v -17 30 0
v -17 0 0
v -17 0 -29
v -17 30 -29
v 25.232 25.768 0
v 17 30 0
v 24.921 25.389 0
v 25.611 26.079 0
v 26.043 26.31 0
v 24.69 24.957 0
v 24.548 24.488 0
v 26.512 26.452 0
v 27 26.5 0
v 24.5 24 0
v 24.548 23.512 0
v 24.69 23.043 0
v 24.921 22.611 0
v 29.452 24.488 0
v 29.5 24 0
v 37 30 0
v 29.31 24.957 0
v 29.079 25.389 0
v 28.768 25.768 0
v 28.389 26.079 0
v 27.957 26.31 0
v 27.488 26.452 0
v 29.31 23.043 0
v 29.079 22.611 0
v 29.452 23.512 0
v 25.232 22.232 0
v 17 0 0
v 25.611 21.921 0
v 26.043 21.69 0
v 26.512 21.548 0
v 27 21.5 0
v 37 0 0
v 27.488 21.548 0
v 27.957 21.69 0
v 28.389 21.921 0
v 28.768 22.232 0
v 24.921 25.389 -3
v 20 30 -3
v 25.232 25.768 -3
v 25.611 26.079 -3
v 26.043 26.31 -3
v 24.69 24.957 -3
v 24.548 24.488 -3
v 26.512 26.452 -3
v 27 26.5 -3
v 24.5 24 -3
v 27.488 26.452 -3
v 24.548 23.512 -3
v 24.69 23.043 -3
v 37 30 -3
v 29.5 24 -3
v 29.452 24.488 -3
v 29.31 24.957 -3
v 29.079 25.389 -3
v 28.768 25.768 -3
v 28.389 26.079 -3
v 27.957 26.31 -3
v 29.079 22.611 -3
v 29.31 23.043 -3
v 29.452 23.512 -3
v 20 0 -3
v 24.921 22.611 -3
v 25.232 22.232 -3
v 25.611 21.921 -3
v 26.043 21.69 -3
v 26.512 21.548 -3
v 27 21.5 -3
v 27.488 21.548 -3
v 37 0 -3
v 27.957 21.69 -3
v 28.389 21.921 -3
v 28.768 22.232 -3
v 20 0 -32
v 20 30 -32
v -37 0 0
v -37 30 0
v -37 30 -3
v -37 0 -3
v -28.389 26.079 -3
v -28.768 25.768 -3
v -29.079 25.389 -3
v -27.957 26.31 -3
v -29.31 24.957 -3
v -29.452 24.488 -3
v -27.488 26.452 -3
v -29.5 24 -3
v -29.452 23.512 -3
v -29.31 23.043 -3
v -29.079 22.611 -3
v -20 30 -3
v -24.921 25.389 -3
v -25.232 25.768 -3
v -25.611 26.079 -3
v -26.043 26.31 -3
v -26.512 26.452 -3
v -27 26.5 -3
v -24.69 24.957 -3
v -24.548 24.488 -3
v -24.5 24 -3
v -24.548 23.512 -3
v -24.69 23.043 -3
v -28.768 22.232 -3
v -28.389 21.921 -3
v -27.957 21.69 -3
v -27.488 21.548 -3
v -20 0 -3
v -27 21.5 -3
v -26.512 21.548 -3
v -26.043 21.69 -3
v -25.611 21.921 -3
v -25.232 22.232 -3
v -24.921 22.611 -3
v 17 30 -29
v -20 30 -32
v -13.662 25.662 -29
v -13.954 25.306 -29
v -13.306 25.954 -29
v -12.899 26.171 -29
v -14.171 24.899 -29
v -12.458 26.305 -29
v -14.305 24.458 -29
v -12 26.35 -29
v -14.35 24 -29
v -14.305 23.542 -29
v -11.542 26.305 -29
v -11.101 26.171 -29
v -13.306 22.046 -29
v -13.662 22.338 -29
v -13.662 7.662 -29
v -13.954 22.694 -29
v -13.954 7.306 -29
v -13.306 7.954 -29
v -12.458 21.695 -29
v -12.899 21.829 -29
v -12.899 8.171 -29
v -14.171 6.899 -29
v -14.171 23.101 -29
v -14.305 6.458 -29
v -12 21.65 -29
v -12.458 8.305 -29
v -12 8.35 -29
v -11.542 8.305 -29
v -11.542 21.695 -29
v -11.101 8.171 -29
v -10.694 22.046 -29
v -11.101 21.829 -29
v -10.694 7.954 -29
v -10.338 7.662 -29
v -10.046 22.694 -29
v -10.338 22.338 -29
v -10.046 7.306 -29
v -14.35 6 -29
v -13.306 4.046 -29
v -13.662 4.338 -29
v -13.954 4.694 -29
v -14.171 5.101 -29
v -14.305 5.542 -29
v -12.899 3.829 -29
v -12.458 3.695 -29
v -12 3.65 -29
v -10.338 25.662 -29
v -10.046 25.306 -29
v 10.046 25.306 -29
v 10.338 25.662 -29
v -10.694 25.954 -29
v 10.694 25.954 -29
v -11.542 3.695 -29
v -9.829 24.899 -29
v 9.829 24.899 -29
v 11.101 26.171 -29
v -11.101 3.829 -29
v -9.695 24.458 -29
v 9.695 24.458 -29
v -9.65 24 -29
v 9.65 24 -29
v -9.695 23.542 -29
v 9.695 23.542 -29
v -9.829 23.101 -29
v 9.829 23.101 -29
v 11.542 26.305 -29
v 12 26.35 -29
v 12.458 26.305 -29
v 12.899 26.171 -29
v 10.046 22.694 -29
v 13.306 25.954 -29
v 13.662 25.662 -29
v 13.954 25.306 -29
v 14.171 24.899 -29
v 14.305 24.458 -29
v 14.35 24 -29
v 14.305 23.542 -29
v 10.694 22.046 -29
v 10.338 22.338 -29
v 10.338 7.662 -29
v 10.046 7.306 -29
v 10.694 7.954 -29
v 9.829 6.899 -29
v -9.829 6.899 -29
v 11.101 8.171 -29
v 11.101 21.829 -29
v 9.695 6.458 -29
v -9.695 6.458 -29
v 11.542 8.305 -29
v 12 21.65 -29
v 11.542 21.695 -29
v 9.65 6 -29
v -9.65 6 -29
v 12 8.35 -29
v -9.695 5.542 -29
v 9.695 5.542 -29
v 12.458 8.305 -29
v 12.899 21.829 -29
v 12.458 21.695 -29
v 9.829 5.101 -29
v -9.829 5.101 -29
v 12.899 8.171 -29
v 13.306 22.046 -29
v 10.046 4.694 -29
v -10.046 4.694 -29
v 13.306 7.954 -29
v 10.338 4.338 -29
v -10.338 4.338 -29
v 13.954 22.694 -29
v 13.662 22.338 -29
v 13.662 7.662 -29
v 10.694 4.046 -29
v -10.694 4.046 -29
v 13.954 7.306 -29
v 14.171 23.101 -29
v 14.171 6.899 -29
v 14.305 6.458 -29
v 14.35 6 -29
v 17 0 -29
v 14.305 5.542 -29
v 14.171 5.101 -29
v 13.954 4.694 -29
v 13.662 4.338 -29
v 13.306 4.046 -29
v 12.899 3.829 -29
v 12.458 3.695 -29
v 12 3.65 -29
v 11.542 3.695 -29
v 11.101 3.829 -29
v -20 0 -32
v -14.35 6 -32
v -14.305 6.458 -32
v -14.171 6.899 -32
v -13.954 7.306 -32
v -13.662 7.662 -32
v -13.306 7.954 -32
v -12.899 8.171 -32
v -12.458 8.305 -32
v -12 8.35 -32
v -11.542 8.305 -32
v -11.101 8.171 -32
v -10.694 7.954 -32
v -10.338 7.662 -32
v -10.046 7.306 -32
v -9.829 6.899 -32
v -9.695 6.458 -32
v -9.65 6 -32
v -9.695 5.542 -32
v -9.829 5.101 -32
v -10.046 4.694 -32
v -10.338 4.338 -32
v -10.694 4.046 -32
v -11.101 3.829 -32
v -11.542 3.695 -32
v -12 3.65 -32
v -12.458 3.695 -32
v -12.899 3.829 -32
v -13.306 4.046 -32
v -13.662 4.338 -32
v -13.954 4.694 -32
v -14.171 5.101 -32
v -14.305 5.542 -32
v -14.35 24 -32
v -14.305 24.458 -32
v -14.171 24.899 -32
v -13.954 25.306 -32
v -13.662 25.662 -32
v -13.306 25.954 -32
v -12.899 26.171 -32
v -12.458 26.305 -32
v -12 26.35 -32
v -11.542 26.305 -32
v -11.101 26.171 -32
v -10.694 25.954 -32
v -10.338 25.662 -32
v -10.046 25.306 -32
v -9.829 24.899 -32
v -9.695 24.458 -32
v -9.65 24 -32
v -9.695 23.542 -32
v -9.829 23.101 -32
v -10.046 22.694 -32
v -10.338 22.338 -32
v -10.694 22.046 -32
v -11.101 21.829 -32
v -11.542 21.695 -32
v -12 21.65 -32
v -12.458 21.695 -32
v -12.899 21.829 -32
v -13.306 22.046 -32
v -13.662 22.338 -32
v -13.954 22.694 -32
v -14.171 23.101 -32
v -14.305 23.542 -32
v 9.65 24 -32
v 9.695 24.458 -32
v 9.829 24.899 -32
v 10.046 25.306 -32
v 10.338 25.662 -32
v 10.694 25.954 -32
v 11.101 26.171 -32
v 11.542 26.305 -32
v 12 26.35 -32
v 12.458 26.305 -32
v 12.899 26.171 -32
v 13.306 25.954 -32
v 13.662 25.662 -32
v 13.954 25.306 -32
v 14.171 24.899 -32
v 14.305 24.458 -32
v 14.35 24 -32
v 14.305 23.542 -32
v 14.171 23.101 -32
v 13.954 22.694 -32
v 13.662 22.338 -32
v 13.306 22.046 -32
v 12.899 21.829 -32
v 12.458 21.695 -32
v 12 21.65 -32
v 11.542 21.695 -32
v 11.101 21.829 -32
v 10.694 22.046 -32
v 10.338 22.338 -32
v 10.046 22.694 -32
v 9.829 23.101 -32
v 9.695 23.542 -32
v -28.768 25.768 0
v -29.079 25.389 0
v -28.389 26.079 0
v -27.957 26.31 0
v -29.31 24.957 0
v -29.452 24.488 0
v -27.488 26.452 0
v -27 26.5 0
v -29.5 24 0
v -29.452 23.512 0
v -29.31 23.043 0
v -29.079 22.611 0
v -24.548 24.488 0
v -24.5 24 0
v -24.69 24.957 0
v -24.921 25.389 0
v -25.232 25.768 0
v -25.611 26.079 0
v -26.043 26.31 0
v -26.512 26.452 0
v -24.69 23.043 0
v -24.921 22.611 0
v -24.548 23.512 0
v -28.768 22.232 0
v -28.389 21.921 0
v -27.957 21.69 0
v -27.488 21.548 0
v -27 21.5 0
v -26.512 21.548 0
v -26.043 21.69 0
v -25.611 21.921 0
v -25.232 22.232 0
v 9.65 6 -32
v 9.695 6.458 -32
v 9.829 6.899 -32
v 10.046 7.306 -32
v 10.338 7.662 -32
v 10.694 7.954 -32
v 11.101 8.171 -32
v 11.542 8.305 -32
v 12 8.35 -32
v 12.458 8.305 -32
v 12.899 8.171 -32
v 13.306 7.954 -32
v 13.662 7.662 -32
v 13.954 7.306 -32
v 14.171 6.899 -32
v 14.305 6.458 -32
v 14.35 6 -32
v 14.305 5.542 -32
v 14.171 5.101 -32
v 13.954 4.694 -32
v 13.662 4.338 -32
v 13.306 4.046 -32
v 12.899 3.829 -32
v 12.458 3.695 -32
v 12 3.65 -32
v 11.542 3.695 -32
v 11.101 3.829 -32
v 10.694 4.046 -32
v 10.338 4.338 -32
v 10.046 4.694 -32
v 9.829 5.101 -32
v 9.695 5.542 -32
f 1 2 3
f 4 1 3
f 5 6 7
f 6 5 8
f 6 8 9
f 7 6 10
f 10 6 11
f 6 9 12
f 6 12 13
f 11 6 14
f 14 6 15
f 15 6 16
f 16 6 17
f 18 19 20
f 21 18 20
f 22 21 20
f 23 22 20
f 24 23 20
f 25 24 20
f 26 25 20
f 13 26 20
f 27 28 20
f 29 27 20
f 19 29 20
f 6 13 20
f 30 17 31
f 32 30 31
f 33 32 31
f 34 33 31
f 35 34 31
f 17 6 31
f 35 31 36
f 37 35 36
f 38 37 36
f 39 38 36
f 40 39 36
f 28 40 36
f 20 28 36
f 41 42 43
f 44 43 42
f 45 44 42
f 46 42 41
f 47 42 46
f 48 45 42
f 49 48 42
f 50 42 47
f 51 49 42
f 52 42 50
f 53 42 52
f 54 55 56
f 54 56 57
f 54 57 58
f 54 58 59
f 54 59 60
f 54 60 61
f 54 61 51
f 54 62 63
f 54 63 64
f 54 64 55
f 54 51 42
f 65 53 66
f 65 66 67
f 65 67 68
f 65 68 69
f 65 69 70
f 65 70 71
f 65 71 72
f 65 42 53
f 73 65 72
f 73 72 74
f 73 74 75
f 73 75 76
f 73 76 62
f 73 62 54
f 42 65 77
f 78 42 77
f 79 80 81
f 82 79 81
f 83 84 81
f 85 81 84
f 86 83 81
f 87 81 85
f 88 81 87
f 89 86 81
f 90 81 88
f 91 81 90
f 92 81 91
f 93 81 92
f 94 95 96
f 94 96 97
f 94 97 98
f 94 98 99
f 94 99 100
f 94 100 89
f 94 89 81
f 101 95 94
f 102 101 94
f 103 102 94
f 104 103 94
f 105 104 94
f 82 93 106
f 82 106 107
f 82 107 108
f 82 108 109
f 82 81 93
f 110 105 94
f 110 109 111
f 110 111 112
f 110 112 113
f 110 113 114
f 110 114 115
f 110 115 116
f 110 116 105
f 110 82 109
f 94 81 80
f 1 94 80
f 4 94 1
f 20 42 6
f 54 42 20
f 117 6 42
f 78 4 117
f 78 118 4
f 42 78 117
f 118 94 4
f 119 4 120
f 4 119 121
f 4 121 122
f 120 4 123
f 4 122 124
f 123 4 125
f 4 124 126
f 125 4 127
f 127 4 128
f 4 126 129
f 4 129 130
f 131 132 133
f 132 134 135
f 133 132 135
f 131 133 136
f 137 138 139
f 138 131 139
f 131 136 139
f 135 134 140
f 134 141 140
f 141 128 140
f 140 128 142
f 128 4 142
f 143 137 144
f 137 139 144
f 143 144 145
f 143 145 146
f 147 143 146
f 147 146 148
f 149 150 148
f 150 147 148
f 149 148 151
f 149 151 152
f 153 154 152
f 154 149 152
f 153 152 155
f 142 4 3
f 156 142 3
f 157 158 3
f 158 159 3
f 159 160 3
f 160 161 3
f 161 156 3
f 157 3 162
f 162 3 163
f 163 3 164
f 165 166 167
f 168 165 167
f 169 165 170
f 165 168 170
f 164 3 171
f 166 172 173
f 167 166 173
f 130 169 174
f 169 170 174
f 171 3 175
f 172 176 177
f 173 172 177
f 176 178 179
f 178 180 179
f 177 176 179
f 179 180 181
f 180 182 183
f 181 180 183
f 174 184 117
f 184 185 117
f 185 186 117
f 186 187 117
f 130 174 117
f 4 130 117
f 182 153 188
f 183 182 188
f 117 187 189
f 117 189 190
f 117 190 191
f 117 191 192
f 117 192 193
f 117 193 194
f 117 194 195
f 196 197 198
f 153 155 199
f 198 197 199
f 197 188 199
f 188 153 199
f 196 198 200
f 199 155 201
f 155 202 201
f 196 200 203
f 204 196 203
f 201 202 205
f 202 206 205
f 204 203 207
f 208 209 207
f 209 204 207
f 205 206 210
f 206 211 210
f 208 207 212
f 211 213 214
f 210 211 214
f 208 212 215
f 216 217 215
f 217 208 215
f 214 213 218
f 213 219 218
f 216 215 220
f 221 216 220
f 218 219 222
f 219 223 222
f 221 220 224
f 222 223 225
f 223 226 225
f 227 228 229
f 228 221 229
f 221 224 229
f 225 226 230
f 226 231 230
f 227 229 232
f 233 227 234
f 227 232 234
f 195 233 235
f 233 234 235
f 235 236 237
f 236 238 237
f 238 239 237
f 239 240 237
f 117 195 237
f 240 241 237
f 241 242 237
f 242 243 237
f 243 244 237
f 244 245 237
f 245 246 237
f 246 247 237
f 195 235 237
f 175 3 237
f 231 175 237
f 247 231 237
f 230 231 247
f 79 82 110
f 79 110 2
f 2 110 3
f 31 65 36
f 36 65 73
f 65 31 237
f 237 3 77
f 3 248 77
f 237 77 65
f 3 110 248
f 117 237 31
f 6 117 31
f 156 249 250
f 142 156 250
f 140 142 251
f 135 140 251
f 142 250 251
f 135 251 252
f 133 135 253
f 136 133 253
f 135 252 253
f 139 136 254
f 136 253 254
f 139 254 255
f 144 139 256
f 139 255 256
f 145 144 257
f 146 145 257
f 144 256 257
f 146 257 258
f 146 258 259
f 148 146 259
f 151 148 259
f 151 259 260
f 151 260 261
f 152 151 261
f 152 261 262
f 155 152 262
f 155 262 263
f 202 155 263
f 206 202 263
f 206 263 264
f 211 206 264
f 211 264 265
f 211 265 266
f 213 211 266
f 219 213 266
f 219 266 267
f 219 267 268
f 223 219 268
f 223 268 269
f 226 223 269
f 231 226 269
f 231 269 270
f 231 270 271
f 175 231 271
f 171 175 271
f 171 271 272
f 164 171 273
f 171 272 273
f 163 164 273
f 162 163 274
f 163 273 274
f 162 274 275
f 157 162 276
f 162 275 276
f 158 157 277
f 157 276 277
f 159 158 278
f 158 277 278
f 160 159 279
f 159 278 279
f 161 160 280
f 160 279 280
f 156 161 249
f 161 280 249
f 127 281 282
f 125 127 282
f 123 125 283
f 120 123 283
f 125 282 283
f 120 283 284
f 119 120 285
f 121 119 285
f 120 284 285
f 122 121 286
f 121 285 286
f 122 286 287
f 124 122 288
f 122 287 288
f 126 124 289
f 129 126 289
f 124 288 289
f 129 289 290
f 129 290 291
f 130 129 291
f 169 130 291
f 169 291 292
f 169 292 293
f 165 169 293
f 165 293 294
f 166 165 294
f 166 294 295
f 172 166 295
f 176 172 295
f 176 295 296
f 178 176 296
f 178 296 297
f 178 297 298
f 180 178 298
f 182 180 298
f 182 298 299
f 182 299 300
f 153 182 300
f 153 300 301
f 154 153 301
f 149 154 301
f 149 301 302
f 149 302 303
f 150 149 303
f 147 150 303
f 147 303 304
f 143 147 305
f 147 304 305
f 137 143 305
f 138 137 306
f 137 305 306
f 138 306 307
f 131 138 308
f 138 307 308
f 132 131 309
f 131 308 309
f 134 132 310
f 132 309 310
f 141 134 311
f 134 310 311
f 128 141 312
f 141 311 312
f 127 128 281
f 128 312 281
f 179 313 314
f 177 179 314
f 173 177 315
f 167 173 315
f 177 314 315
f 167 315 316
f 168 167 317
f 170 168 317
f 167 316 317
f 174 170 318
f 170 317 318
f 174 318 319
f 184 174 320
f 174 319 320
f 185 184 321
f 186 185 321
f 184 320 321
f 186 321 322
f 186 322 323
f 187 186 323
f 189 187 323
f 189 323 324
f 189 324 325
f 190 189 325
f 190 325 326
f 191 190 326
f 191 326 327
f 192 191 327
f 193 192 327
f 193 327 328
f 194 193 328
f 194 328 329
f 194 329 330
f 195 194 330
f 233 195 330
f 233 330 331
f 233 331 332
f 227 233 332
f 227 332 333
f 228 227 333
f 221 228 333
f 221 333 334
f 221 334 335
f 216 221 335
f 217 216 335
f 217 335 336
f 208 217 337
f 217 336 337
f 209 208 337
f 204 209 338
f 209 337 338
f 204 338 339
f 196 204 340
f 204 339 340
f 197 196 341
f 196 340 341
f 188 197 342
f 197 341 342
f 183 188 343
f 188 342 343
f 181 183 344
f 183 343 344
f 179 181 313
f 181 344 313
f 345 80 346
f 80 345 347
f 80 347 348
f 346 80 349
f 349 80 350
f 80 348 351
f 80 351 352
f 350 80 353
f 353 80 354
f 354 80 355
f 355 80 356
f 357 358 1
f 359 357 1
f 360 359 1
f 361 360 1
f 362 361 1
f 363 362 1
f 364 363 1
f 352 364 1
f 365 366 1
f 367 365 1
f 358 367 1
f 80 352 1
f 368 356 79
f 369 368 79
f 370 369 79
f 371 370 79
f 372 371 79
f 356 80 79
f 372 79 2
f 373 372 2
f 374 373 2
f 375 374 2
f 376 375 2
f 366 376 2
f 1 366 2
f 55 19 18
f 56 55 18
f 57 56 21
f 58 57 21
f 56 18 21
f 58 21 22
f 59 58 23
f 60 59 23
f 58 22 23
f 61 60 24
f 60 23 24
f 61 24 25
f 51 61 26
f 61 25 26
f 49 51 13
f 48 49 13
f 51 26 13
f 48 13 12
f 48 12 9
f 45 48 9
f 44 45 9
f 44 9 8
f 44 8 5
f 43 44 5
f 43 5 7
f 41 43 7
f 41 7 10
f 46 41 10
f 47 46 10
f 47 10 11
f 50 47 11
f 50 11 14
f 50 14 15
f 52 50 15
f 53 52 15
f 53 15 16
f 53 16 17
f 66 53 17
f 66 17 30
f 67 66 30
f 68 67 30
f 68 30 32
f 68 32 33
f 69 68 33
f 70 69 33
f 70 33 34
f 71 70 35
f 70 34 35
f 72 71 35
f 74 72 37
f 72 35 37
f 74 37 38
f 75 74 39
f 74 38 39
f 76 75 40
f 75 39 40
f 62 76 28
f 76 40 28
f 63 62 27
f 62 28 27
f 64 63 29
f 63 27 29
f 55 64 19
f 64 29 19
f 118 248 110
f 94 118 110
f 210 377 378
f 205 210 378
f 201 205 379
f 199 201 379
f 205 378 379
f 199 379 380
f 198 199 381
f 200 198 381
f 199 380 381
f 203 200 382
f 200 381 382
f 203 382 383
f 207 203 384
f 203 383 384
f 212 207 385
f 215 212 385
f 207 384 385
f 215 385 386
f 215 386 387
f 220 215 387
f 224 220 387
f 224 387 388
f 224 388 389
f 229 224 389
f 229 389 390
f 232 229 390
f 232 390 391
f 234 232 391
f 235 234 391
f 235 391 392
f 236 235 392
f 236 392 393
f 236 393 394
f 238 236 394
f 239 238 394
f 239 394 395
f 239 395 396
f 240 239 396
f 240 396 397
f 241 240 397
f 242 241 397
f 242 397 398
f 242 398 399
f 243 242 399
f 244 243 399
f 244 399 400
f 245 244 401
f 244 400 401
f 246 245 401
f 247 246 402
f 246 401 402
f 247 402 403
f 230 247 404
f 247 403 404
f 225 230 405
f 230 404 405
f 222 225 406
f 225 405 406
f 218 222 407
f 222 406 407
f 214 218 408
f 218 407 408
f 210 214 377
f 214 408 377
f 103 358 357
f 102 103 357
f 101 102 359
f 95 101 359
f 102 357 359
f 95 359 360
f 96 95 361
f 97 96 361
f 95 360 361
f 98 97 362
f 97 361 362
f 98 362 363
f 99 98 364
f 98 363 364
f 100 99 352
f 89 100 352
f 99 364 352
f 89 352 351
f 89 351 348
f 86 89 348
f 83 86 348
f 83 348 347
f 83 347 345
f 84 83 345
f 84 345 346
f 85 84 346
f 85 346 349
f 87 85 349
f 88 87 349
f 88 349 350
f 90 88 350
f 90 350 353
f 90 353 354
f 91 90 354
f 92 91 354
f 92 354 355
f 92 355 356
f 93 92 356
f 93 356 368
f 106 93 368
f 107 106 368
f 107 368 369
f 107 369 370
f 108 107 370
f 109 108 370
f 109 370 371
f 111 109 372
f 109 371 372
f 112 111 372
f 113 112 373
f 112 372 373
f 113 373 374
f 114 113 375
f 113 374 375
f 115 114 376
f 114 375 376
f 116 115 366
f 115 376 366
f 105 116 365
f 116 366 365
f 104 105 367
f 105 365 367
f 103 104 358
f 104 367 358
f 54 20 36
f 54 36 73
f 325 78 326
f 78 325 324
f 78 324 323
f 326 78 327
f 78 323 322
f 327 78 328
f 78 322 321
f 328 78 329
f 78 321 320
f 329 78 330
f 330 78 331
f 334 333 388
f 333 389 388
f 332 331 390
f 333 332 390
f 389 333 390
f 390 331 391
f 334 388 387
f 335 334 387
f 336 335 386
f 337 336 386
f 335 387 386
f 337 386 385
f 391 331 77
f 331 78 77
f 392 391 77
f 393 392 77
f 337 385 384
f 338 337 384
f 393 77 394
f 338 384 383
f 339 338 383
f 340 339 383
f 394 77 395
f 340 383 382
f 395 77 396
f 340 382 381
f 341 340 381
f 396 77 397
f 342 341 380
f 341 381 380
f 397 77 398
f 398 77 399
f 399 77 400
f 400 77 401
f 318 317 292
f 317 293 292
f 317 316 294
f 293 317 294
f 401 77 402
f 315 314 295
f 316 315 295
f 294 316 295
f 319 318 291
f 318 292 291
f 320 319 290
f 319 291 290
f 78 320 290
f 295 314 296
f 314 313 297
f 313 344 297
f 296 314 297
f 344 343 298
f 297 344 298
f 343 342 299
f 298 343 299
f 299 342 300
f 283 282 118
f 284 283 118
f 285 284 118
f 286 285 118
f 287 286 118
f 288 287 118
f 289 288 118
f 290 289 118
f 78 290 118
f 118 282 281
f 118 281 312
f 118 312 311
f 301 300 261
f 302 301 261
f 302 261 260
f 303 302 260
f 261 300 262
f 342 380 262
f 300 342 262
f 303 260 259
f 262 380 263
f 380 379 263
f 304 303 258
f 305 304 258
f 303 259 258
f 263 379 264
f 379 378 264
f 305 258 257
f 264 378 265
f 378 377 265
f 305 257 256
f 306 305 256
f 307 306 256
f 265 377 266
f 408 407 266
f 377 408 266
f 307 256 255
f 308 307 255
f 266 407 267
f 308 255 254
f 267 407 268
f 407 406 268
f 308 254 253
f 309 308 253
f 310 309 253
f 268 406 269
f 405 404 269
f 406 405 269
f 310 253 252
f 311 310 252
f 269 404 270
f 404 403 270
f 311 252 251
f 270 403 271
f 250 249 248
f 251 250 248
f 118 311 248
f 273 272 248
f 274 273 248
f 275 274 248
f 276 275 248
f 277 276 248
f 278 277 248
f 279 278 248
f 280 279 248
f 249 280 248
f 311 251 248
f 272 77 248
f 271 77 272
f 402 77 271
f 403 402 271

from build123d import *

# Parameters (mm, degrees)
SKETCH1_W           = 3
SKETCH1_H           = 3
SKETCH1_W_2         = 17
BOSS_EXTRUDE1_DEPTH = 30
SKETCH2_R           = 2.5
CUT_EXTRUDE1_DEPTH  = 30
SKETCH3_R           = 2.35
CUT_EXTRUDE2_DEPTH  = 30


with BuildPart() as part:
    # Sketch1 → Boss-Extrude1 (new body)
    with BuildSketch(Plane(origin=(0, 0, 0), x_dir=(1, 0, 0), z_dir=(0, 1, 0))):
        Polygon((-17, 29), (0, 29), (17, 29), (17, 3), (20, 3), (20, 32), (-20, 32), (-20, 3), (-17, 3), align=None)
        with Locations((-18.5, 1.5)):
            Rectangle(SKETCH1_W, SKETCH1_H)
        with Locations((-28.5, 1.5)):
            Rectangle(SKETCH1_W_2, SKETCH1_H)
        with Locations((18.5, 1.5)):
            Rectangle(SKETCH1_W, SKETCH1_H)
        with Locations((28.5, 1.5)):
            Rectangle(SKETCH1_W_2, SKETCH1_H)
    extrude(amount=BOSS_EXTRUDE1_DEPTH)

    # Sketch2 → Cut-Extrude1 (cut)
    with BuildSketch(Plane.XY):
        with Locations((-27, 24)):
            Circle(SKETCH2_R)
        with Locations((27, 24)):
            Circle(SKETCH2_R)
    extrude(amount=-CUT_EXTRUDE1_DEPTH, mode=Mode.SUBTRACT)

    # Sketch3 → Cut-Extrude2 (cut)
    with BuildSketch(Plane(origin=(0, 0, -32), x_dir=(-1, 0, 0), z_dir=(0, 0, -1))):
        with Locations((-12, 6)):
            Circle(SKETCH3_R)
        with Locations((12, 6)):
            Circle(SKETCH3_R)
        with Locations((12, 24)):
            Circle(SKETCH3_R)
        with Locations((-12, 24)):
            Circle(SKETCH3_R)
    extrude(amount=-CUT_EXTRUDE2_DEPTH, mode=Mode.SUBTRACT)


solid = part.part
